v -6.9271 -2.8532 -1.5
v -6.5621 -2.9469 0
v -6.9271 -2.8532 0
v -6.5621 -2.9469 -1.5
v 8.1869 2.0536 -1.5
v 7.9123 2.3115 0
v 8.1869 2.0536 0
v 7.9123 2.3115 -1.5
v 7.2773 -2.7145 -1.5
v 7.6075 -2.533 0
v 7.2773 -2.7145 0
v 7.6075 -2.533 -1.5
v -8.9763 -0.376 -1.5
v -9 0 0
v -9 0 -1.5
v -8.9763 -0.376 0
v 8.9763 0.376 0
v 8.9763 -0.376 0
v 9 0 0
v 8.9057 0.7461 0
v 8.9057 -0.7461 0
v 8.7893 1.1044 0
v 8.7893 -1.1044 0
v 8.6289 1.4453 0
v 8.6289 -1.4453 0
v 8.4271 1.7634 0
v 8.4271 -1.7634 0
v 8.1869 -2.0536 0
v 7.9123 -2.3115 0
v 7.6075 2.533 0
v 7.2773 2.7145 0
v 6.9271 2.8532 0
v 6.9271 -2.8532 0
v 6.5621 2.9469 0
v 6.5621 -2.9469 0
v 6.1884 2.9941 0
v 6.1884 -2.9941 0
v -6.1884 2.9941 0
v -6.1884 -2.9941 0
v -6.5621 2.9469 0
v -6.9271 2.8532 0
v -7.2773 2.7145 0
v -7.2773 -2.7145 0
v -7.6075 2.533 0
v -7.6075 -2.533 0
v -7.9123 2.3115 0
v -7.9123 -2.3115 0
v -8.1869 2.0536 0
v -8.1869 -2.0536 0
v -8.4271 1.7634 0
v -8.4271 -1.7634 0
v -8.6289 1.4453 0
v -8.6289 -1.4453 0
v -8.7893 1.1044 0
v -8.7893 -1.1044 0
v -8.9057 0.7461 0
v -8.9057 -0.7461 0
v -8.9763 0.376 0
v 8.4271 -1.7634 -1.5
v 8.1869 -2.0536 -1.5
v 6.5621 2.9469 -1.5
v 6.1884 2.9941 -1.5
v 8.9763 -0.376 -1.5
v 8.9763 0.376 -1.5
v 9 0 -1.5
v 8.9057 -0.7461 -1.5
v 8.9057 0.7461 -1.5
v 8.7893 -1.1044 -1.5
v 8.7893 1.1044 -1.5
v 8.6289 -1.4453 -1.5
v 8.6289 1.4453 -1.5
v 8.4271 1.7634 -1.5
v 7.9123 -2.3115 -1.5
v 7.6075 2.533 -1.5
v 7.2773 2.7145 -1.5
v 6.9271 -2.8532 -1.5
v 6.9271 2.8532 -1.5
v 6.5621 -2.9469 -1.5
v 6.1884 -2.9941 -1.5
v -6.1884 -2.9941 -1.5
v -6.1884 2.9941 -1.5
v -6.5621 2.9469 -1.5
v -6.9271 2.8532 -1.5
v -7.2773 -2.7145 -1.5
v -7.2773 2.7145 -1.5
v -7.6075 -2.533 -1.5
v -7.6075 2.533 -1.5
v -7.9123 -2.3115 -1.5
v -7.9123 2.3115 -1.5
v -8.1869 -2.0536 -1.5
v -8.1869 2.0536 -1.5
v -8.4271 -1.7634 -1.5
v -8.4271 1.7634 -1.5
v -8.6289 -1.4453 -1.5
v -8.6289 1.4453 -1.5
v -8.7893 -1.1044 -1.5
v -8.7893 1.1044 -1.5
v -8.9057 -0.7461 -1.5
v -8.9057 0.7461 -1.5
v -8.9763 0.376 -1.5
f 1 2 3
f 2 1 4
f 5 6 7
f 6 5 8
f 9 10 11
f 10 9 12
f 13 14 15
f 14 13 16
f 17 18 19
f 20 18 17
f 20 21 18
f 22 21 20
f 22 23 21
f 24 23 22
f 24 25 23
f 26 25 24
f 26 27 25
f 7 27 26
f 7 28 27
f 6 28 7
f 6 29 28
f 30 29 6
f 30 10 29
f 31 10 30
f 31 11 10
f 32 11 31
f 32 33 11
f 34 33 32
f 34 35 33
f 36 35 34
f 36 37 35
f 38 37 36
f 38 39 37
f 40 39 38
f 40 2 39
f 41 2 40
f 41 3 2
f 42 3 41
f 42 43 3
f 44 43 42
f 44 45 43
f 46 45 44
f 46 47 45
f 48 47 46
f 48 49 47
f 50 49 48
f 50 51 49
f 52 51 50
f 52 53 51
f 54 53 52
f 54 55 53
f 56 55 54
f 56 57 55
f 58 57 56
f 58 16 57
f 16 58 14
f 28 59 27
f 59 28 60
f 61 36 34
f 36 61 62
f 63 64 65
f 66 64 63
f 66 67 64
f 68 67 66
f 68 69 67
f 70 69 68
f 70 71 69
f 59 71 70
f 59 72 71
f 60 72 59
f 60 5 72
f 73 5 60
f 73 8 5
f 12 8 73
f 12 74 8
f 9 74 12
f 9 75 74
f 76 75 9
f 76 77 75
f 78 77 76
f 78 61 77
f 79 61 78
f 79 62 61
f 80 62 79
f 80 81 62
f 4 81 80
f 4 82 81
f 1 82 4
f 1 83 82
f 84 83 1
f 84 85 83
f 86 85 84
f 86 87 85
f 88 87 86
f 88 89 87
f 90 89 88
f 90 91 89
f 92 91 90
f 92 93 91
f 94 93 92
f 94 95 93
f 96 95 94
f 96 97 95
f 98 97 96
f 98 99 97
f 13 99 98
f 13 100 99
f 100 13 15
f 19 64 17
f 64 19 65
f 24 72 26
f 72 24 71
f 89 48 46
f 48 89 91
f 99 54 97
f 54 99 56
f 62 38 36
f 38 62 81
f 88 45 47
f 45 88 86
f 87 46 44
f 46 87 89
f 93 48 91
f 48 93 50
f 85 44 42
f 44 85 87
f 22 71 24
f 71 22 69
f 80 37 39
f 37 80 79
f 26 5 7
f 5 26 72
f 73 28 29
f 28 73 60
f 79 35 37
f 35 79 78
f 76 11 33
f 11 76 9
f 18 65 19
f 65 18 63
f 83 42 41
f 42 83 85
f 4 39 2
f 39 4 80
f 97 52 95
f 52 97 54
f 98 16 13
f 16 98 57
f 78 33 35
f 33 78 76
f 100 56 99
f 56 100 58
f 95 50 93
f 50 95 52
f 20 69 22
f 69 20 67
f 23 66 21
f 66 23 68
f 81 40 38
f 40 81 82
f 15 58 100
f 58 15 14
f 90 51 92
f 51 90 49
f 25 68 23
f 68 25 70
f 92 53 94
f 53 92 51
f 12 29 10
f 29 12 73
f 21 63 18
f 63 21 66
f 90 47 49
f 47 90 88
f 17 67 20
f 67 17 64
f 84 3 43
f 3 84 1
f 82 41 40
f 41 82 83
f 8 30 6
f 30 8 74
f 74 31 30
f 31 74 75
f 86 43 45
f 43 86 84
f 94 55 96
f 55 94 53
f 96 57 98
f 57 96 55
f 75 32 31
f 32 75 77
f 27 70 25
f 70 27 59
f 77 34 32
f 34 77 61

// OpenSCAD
$fn = 50;

difference() {
	union() {
		translate(v = [0, 0, 0]) {
			rotate(a = [0, 0, 0]) {
				difference() {
					union() {
						translate(v = [0, 0, 0]) {
							rotate(a = [0, 0, 0]) {
								hull() {
									difference() {
										union() {
											translate(v = [-6.0, 0, 0]) {
												rotate(a = [0, 0, 0]) {
													difference() {
														union() {
															translate(v = [0, 0, -1.5]) {
																cylinder(h = 1.5, r = 3.0);
															}
														}
														union();
													}
												}
											}
											translate(v = [6.0, 0, 0]) {
												rotate(a = [0, 0, 0]) {
													difference() {
														union() {
															translate(v = [0, 0, -1.5]) {
																cylinder(h = 1.5, r = 3.0);
															}
														}
														union();
													}
												}
											}
										}
										union();
									}
								}
							}
						}
					}
					union();
				}
			}
		}
	}
	union();
}
